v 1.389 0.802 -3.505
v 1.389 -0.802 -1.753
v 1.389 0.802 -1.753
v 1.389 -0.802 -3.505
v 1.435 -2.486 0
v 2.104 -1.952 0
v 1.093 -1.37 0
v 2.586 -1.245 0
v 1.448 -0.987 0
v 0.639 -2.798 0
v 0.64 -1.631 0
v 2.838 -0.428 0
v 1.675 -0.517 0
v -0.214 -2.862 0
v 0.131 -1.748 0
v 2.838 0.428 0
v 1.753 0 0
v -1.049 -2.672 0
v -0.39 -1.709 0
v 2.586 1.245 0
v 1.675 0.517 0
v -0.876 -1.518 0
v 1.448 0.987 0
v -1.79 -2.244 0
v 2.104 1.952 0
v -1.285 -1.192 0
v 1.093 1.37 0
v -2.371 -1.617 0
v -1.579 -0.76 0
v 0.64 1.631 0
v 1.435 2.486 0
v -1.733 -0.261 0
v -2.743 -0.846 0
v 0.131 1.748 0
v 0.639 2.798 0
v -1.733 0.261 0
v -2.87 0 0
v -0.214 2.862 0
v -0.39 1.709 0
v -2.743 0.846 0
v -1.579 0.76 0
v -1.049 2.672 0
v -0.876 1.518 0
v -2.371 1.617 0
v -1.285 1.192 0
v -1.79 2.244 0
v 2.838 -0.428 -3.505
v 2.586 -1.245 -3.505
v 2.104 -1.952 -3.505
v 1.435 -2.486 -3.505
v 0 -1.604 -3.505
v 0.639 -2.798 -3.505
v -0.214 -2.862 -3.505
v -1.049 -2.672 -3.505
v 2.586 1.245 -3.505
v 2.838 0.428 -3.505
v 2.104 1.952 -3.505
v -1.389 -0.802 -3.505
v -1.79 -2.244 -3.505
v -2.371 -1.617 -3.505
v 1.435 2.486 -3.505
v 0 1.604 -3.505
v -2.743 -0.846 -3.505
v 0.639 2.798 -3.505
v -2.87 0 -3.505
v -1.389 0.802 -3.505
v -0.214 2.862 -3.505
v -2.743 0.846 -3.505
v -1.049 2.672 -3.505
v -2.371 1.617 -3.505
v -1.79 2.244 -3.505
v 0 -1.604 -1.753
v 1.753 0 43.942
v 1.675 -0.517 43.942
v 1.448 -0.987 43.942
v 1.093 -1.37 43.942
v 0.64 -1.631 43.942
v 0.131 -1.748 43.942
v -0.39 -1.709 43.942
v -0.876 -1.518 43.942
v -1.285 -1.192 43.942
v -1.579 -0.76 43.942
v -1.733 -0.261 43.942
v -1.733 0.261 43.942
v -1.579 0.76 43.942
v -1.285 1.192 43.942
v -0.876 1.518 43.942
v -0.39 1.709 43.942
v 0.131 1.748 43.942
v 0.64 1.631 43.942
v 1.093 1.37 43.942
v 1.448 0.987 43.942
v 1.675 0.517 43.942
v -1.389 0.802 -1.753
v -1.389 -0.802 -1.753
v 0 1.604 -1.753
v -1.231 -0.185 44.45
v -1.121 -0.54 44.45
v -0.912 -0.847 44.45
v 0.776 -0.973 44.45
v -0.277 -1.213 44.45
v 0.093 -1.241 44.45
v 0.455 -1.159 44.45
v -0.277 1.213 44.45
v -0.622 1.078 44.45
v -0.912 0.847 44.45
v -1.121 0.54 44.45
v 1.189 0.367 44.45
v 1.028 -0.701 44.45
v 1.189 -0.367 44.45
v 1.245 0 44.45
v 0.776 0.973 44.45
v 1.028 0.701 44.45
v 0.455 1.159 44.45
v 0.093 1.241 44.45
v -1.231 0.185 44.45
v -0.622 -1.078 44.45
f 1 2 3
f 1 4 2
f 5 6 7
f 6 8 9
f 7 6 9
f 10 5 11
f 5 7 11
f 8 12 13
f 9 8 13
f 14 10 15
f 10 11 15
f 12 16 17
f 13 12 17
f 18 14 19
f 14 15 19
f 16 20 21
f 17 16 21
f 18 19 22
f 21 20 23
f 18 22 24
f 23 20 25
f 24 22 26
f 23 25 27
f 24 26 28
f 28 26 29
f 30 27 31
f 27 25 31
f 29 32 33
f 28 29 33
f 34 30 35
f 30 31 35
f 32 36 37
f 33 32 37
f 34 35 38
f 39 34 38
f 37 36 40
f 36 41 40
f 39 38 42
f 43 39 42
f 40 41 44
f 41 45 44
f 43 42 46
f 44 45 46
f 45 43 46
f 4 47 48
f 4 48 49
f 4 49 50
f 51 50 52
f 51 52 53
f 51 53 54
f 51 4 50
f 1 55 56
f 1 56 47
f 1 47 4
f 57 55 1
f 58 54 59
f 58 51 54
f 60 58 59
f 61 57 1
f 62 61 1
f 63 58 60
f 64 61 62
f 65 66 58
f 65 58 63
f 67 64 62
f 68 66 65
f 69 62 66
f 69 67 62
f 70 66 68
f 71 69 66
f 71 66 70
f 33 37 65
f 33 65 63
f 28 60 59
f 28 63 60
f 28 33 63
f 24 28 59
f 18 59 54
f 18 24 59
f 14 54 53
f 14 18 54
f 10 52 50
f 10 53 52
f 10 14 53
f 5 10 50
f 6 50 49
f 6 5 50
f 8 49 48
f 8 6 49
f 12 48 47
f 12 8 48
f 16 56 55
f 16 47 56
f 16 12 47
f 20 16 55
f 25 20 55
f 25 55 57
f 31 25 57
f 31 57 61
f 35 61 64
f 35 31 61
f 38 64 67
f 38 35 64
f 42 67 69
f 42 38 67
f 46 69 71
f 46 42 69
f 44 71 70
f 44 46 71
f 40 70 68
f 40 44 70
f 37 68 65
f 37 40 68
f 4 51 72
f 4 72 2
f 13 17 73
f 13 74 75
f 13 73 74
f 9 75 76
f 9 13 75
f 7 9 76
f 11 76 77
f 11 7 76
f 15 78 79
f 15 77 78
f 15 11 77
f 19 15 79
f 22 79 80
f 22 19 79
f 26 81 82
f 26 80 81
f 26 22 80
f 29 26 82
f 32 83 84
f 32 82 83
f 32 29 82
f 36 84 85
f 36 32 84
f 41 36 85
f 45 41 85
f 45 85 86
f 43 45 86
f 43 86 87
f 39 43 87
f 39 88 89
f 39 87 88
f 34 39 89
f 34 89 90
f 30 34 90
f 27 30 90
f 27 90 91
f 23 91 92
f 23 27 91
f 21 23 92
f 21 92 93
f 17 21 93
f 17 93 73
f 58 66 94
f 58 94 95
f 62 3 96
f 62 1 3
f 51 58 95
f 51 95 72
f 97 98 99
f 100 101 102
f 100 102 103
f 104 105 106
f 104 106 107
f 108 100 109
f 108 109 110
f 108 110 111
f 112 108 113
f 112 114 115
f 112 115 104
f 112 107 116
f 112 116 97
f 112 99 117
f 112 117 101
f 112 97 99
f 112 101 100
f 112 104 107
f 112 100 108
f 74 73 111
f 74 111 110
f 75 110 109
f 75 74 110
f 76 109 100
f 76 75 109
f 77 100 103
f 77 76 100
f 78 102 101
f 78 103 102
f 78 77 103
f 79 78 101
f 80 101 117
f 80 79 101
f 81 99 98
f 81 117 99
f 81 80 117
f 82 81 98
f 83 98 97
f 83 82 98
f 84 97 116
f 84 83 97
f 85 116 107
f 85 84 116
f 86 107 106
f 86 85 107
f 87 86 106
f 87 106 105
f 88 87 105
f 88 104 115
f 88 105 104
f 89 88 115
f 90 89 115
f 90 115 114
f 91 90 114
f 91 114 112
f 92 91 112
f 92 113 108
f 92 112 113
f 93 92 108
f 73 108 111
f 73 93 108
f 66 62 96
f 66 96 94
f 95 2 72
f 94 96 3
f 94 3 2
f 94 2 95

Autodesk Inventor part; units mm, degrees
ref_plane "YZ Plane" through (0, 0, 0) normal (1, 0, 0) x (0, 1, 0)
ref_plane "XZ Plane" through (0, 0, 0) normal (0, 1, 0) x (-1, 0, 0)
ref_plane "XY Plane" through (0, 0, 0) normal (0, 0, 1) x (1, 0, 0)
sketch "Sketch1" plane through (0, 0, 0) normal (0, 0, 1) x (1, 0, 0)
  circle A0 centre (0, 0) radius 1.7526
  dimension "d0" = 3.5052
extrude "Extrusion1" add sketch "Sketch1" along normal blind 44.45
sketch "Sketch2" plane through (0, 0, 0) normal (0, 0, -1) x (-1, 0, 0)
  circle A0 centre (0, 0) radius 1.7526 construction
  circle A1 centre (0, 0) radius 2.8702
  dimension "d3" = 5.7404
extrude "Extrusion2" add sketch "Sketch2" along normal blind 3.5052
sketch "Sketch3" plane through (0, 0, -3.5052) normal (0, 0, -1) x (-1, 0, 0)
  circle A0 centre (0, 0) radius 2.8702 projected
  line L0 (0, 1.604) -> (1.3891, 0.802)
  line L1 (1.3891, 0.802) -> (1.3891, -0.802)
  line L2 (1.3891, -0.802) -> (0, -1.604)
  line L3 (0, -1.604) -> (-1.3891, -0.802)
  line L4 (-1.3891, -0.802) -> (-1.3891, 0.802)
  line L5 (-1.3891, 0.802) -> (0, 1.604)
  dimension "d6" = 2.7781
extrude "Extrusion3" cut sketch "Sketch3" against normal blind 1.7526 contours L0 L1 L2 L3 L4 L5
chamfer "Chamfer1" distance 0.508 angle 45 1 edges at (-1.7526, 0, 44.45)
thread "Thread2" size "6-32 UNC" class "2A" standard "ANSI Unified Screw Threads" length 25.4
properties part number "6-32 SHCS x500" material "Stainless Steel"
